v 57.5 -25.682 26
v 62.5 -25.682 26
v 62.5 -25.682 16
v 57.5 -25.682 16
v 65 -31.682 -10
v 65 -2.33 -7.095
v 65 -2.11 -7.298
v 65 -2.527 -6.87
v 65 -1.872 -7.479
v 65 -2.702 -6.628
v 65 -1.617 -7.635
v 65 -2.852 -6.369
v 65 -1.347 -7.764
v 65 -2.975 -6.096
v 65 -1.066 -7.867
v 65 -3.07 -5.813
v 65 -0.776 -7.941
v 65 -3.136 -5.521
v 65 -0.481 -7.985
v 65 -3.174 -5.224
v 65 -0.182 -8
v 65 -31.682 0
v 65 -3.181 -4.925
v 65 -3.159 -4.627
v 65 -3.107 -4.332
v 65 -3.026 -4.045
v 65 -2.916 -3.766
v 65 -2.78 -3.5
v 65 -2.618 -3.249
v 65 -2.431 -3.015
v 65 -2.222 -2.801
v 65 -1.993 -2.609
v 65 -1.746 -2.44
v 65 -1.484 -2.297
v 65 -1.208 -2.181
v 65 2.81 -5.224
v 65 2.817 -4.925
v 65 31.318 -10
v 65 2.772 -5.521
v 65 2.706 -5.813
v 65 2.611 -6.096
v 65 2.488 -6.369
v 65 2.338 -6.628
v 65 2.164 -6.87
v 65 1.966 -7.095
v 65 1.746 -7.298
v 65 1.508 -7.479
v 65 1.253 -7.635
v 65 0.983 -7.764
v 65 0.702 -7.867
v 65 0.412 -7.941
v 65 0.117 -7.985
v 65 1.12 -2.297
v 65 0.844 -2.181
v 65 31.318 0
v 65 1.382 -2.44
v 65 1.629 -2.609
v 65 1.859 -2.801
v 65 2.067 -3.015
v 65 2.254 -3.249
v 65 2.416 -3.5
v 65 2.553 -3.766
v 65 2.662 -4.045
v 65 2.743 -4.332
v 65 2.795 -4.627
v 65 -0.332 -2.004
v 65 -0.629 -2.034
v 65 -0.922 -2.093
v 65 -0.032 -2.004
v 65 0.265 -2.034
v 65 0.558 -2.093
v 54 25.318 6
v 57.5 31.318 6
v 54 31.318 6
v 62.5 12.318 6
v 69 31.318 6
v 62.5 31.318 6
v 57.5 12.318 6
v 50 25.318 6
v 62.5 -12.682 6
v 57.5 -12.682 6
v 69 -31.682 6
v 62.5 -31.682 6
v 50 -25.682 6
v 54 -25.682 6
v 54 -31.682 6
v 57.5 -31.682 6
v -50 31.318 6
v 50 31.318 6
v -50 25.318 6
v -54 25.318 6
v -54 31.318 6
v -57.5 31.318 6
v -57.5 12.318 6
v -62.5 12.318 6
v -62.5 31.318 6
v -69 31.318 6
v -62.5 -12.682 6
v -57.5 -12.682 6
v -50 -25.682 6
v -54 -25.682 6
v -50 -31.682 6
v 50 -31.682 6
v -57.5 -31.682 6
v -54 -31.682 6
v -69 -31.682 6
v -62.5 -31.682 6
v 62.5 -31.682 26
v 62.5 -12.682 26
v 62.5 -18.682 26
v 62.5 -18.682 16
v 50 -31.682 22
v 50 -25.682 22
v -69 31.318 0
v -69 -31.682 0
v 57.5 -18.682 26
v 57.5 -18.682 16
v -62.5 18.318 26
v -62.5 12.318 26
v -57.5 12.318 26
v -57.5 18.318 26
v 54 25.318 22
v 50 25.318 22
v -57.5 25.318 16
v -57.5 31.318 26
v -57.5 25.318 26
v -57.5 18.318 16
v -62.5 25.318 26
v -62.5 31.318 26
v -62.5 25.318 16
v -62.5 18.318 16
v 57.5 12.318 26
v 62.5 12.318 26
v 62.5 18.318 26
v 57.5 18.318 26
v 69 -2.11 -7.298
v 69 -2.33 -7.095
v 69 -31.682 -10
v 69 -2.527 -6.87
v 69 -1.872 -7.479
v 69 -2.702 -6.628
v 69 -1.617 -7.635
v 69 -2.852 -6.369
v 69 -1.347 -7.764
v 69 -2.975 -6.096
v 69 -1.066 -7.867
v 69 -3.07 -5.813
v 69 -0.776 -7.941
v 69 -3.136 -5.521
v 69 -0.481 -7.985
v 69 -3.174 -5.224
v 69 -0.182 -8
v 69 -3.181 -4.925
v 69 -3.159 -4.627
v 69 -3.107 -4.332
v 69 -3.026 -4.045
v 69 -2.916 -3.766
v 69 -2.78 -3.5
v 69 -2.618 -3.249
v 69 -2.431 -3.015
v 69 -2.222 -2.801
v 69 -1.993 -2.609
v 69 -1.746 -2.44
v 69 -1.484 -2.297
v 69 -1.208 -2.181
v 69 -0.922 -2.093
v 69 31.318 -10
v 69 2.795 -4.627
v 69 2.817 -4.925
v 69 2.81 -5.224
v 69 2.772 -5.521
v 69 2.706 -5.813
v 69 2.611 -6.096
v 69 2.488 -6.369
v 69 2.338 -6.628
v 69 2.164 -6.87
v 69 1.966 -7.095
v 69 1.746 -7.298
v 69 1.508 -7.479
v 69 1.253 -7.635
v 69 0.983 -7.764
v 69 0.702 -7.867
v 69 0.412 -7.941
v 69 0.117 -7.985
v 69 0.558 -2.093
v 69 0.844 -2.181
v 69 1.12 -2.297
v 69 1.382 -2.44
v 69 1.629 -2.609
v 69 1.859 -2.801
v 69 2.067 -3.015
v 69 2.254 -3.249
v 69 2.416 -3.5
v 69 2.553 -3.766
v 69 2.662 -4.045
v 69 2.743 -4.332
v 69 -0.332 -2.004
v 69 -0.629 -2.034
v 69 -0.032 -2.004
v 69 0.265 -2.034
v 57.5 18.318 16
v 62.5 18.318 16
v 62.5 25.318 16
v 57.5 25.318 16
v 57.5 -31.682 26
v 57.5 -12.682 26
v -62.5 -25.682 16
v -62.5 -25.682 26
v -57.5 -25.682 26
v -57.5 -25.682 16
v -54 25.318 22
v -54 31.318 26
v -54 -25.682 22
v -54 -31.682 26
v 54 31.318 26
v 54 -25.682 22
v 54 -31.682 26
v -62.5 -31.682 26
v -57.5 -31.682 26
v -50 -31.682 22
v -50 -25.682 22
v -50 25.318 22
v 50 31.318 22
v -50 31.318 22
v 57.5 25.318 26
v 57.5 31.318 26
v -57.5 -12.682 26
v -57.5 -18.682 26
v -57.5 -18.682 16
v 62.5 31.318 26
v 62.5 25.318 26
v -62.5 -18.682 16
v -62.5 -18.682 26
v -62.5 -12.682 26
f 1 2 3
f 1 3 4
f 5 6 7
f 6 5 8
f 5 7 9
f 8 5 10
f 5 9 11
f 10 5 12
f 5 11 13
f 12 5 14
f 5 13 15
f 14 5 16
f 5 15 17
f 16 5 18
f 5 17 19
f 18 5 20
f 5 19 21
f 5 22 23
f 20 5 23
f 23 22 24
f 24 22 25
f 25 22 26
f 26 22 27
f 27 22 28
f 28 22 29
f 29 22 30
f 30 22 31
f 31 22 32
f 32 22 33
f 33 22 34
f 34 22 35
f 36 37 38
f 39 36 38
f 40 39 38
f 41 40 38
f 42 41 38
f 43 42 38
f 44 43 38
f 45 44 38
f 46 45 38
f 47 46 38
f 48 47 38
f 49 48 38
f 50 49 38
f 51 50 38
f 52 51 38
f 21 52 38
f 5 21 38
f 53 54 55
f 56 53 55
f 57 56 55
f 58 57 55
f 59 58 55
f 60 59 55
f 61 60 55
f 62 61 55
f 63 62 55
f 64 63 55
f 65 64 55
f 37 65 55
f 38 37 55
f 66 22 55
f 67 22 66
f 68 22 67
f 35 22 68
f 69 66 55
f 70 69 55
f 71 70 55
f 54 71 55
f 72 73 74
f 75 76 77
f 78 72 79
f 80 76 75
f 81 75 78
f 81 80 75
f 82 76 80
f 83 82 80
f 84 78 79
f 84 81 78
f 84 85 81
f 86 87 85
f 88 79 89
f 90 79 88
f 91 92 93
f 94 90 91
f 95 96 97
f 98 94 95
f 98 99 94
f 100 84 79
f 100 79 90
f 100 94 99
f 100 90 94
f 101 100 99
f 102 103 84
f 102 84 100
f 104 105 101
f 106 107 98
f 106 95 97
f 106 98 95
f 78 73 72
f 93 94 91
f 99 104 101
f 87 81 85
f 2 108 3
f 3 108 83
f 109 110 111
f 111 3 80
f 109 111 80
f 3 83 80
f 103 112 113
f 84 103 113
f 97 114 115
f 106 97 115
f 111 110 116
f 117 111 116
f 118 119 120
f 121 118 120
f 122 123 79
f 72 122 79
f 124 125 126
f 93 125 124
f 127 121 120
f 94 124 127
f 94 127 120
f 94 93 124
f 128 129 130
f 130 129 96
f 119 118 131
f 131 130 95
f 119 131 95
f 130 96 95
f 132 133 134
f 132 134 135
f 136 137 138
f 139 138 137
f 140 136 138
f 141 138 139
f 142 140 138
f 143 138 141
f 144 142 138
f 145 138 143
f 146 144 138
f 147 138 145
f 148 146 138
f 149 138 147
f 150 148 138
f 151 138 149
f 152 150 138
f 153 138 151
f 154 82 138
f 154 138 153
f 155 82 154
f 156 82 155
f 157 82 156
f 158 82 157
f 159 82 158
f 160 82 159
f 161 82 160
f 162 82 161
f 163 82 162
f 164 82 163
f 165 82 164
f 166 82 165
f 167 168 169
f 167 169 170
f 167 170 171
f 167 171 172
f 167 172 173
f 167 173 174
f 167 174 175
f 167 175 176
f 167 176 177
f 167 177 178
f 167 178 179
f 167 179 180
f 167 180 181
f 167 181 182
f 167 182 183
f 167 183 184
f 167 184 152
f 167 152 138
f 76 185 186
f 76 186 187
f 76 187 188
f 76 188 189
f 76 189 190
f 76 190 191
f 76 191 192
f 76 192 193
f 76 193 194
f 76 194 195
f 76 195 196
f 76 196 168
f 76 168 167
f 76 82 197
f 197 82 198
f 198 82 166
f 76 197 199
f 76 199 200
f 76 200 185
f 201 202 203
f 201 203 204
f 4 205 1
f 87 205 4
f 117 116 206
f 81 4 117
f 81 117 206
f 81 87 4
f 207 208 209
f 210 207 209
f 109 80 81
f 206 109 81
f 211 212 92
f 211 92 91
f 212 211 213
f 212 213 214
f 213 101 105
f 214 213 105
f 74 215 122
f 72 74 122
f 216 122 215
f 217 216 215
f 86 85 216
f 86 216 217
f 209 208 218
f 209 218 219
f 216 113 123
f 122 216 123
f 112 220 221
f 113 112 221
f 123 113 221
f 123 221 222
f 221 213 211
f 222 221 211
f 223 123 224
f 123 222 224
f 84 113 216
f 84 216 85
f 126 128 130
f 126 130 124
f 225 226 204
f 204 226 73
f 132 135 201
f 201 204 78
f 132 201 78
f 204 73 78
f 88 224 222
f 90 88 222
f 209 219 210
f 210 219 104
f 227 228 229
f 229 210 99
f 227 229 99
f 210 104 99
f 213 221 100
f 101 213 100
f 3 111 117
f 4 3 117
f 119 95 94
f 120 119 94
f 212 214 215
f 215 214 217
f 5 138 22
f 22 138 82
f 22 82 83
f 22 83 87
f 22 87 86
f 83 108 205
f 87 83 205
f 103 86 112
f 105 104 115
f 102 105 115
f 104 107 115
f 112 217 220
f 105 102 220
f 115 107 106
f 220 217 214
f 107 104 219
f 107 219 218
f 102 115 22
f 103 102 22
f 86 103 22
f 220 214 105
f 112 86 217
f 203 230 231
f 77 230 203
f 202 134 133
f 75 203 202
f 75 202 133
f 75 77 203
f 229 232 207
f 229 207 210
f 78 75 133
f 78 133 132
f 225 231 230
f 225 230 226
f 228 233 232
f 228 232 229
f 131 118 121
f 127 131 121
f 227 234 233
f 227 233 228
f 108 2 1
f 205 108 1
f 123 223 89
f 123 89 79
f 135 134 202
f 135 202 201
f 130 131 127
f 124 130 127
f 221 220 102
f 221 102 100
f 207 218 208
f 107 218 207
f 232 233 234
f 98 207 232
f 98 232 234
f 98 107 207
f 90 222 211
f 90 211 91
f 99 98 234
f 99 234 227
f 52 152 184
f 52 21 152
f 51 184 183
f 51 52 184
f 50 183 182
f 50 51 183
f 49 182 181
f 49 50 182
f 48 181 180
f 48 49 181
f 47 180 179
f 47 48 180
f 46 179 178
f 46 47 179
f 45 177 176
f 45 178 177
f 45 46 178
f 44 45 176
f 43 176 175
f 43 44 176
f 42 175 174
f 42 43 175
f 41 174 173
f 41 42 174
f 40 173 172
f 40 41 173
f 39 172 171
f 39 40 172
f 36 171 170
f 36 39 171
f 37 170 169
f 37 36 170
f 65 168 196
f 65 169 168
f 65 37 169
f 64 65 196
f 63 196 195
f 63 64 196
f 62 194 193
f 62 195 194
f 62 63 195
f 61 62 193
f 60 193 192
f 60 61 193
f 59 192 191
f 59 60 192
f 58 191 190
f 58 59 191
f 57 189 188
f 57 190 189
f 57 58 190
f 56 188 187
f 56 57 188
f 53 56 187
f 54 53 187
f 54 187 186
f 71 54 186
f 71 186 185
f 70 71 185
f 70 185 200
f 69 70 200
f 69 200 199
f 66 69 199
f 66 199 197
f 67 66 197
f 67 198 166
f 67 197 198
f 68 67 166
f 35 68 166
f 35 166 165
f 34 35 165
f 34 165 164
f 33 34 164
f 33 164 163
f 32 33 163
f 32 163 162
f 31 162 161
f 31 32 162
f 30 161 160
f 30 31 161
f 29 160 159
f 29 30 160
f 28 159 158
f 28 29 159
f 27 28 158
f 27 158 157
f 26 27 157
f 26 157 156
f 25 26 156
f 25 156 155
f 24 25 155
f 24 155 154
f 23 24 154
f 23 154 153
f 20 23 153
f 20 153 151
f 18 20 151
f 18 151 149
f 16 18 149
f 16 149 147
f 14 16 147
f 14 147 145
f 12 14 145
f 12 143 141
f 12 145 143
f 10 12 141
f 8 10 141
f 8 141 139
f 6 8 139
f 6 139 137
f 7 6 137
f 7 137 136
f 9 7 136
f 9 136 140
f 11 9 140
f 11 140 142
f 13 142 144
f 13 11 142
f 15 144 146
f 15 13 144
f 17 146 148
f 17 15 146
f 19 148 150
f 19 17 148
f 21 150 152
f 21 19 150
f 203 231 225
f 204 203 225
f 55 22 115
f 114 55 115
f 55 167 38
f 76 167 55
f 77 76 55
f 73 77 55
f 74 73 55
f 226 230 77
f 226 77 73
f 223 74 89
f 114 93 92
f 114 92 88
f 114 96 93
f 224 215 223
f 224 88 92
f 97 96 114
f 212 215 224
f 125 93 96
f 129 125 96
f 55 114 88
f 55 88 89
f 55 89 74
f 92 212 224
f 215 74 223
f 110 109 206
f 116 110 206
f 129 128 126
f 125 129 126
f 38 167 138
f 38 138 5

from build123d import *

# Parameters (mm, degrees)
ESBO_O1_W                  = 69
ESBO_O1_H                  = 31.5
RESSALTO_EXTRUS_O1_DEPTH   = 6
ESBO_O2_W                  = 5
ESBO_O2_H                  = 19
RESSALTO_EXTRUS_O2_DEPTH   = 20
ESBO_O3_W                  = 5
ESBO_O3_H                  = 7
CORTE_EXTRUS_O1_DEPTH      = 10
ESBO_O4_W                  = 4
ESBO_O4_H                  = 31.5
RESSALTO_EXTRUS_O3_DEPTH   = 20
CORTE_EXTRUS_O2_DEPTH      = 4
ESBO_O6_W                  = 4
ESBO_O6_H                  = 6
RESSALTO_EXTRUS_O4_DEPTH   = 50
ESBO_O7_W                  = 4
ESBO_O7_H                  = 63
RESSALTO_EXTRUS_O5_DEPTH   = 10
CORTE_EXTRUS_O3_DEPTH      = 144.957450913
CORTE_EXTRUS_O3_DEPTH_BACK = 144.957450913
ESBO_O8_R                  = 3
ESBO_O13_W                 = 100
ESBO_O13_H                 = 4
RESSALTO_EXTRUS_O6_DEPTH   = 53


with BuildPart() as part:
    # Esboço1 → Ressalto-extrusão1 (new body)
    with BuildSketch(Plane.XY):
        with Locations((-34.5, -15.931977108)):
            Rectangle(ESBO_O1_W, ESBO_O1_H)
    extrude(amount=RESSALTO_EXTRUS_O1_DEPTH)

    # Esboço2 → Ressalto-extrusão2 (add)
    with BuildSketch(Plane.XY.offset(6)):
        with Locations((-60, -22.181977108)):
            Rectangle(ESBO_O2_W, ESBO_O2_H)
    extrude(amount=RESSALTO_EXTRUS_O2_DEPTH)

    # Esboço3 → Corte-extrusão1 (cut)
    with BuildSketch(Plane.XY.offset(26)):
        with Locations((-60, -22.181977108)):
            Rectangle(ESBO_O3_W, ESBO_O3_H)
    extrude(amount=-CORTE_EXTRUS_O1_DEPTH, mode=Mode.SUBTRACT)

    # Esboço4 → Ressalto-extrusão3 (add)
    with BuildSketch(Plane.XY.offset(6)):
        with Locations((-52, -15.931977108)):
            Rectangle(ESBO_O4_W, ESBO_O4_H)
    extrude(amount=RESSALTO_EXTRUS_O3_DEPTH)

    # Esboço5 → Corte-extrusão2 (cut)
    with BuildSketch(Plane(origin=(-50, 0, 0), x_dir=(0, 0, -1), z_dir=(1, 0, 0))):
        Polygon((-22, -25.681977108), (-6, -25.681977108), (-6, -0.181977108), (-22, -0.181977108), (-22, -6.181977108), align=None)
    extrude(amount=-CORTE_EXTRUS_O2_DEPTH, mode=Mode.SUBTRACT)

    # Esboço6 → Ressalto-extrusão4 (add)
    with BuildSketch(Plane(origin=(-50, 0, 0), x_dir=(0, 0, -1), z_dir=(1, 0, 0))):
        with Locations((-24, -28.681977108)):
            Rectangle(ESBO_O6_W, ESBO_O6_H)
    extrude(amount=RESSALTO_EXTRUS_O4_DEPTH)

    # Espelhar10: part across plane


with BuildPart() as part_1:
    add(part.part)
    add(part.part.mirror(Plane.ZX.offset(-0.181977108)))

    # Espelhar11: part across plane


with BuildPart() as part_2:
    add(part_1.part)
    add(part_1.part.mirror(Plane(origin=(0, 0, 0), x_dir=(0, 0, 1), z_dir=(1, 0, 0))))

    # Esboço7 → Ressalto-extrusão5 (add)
    with BuildSketch(Plane(origin=(0, 0, 0), x_dir=(-1, 0, 0), z_dir=(0, 0, -1))):
        with Locations((-67, -0.181977108)):
            Rectangle(ESBO_O7_W, ESBO_O7_H)
    extrude(amount=RESSALTO_EXTRUS_O5_DEPTH)

    # Esboço8 → Corte-extrusão3 (cut, two sides: drawn at the far end of the back side and taken through both)
    with BuildSketch(Plane(origin=(69, 0, 0), x_dir=(0, 0, -1), z_dir=(1, 0, 0)).offset(-CORTE_EXTRUS_O3_DEPTH_BACK)):
        with Locations((5, -0.181977108)):
            Circle(ESBO_O8_R)
    extrude(amount=CORTE_EXTRUS_O3_DEPTH + CORTE_EXTRUS_O3_DEPTH_BACK, mode=Mode.SUBTRACT)

    # Esboço13 → Ressalto-extrusão6 (add)
    with BuildSketch(Plane(origin=(0, -25.681977108, 0), x_dir=(1, 0, 0), z_dir=(0, 1, 0))):
        with Locations((0, -24)):
            Rectangle(ESBO_O13_W, ESBO_O13_H)
    extrude(amount=RESSALTO_EXTRUS_O6_DEPTH)


solid = part_2.part
